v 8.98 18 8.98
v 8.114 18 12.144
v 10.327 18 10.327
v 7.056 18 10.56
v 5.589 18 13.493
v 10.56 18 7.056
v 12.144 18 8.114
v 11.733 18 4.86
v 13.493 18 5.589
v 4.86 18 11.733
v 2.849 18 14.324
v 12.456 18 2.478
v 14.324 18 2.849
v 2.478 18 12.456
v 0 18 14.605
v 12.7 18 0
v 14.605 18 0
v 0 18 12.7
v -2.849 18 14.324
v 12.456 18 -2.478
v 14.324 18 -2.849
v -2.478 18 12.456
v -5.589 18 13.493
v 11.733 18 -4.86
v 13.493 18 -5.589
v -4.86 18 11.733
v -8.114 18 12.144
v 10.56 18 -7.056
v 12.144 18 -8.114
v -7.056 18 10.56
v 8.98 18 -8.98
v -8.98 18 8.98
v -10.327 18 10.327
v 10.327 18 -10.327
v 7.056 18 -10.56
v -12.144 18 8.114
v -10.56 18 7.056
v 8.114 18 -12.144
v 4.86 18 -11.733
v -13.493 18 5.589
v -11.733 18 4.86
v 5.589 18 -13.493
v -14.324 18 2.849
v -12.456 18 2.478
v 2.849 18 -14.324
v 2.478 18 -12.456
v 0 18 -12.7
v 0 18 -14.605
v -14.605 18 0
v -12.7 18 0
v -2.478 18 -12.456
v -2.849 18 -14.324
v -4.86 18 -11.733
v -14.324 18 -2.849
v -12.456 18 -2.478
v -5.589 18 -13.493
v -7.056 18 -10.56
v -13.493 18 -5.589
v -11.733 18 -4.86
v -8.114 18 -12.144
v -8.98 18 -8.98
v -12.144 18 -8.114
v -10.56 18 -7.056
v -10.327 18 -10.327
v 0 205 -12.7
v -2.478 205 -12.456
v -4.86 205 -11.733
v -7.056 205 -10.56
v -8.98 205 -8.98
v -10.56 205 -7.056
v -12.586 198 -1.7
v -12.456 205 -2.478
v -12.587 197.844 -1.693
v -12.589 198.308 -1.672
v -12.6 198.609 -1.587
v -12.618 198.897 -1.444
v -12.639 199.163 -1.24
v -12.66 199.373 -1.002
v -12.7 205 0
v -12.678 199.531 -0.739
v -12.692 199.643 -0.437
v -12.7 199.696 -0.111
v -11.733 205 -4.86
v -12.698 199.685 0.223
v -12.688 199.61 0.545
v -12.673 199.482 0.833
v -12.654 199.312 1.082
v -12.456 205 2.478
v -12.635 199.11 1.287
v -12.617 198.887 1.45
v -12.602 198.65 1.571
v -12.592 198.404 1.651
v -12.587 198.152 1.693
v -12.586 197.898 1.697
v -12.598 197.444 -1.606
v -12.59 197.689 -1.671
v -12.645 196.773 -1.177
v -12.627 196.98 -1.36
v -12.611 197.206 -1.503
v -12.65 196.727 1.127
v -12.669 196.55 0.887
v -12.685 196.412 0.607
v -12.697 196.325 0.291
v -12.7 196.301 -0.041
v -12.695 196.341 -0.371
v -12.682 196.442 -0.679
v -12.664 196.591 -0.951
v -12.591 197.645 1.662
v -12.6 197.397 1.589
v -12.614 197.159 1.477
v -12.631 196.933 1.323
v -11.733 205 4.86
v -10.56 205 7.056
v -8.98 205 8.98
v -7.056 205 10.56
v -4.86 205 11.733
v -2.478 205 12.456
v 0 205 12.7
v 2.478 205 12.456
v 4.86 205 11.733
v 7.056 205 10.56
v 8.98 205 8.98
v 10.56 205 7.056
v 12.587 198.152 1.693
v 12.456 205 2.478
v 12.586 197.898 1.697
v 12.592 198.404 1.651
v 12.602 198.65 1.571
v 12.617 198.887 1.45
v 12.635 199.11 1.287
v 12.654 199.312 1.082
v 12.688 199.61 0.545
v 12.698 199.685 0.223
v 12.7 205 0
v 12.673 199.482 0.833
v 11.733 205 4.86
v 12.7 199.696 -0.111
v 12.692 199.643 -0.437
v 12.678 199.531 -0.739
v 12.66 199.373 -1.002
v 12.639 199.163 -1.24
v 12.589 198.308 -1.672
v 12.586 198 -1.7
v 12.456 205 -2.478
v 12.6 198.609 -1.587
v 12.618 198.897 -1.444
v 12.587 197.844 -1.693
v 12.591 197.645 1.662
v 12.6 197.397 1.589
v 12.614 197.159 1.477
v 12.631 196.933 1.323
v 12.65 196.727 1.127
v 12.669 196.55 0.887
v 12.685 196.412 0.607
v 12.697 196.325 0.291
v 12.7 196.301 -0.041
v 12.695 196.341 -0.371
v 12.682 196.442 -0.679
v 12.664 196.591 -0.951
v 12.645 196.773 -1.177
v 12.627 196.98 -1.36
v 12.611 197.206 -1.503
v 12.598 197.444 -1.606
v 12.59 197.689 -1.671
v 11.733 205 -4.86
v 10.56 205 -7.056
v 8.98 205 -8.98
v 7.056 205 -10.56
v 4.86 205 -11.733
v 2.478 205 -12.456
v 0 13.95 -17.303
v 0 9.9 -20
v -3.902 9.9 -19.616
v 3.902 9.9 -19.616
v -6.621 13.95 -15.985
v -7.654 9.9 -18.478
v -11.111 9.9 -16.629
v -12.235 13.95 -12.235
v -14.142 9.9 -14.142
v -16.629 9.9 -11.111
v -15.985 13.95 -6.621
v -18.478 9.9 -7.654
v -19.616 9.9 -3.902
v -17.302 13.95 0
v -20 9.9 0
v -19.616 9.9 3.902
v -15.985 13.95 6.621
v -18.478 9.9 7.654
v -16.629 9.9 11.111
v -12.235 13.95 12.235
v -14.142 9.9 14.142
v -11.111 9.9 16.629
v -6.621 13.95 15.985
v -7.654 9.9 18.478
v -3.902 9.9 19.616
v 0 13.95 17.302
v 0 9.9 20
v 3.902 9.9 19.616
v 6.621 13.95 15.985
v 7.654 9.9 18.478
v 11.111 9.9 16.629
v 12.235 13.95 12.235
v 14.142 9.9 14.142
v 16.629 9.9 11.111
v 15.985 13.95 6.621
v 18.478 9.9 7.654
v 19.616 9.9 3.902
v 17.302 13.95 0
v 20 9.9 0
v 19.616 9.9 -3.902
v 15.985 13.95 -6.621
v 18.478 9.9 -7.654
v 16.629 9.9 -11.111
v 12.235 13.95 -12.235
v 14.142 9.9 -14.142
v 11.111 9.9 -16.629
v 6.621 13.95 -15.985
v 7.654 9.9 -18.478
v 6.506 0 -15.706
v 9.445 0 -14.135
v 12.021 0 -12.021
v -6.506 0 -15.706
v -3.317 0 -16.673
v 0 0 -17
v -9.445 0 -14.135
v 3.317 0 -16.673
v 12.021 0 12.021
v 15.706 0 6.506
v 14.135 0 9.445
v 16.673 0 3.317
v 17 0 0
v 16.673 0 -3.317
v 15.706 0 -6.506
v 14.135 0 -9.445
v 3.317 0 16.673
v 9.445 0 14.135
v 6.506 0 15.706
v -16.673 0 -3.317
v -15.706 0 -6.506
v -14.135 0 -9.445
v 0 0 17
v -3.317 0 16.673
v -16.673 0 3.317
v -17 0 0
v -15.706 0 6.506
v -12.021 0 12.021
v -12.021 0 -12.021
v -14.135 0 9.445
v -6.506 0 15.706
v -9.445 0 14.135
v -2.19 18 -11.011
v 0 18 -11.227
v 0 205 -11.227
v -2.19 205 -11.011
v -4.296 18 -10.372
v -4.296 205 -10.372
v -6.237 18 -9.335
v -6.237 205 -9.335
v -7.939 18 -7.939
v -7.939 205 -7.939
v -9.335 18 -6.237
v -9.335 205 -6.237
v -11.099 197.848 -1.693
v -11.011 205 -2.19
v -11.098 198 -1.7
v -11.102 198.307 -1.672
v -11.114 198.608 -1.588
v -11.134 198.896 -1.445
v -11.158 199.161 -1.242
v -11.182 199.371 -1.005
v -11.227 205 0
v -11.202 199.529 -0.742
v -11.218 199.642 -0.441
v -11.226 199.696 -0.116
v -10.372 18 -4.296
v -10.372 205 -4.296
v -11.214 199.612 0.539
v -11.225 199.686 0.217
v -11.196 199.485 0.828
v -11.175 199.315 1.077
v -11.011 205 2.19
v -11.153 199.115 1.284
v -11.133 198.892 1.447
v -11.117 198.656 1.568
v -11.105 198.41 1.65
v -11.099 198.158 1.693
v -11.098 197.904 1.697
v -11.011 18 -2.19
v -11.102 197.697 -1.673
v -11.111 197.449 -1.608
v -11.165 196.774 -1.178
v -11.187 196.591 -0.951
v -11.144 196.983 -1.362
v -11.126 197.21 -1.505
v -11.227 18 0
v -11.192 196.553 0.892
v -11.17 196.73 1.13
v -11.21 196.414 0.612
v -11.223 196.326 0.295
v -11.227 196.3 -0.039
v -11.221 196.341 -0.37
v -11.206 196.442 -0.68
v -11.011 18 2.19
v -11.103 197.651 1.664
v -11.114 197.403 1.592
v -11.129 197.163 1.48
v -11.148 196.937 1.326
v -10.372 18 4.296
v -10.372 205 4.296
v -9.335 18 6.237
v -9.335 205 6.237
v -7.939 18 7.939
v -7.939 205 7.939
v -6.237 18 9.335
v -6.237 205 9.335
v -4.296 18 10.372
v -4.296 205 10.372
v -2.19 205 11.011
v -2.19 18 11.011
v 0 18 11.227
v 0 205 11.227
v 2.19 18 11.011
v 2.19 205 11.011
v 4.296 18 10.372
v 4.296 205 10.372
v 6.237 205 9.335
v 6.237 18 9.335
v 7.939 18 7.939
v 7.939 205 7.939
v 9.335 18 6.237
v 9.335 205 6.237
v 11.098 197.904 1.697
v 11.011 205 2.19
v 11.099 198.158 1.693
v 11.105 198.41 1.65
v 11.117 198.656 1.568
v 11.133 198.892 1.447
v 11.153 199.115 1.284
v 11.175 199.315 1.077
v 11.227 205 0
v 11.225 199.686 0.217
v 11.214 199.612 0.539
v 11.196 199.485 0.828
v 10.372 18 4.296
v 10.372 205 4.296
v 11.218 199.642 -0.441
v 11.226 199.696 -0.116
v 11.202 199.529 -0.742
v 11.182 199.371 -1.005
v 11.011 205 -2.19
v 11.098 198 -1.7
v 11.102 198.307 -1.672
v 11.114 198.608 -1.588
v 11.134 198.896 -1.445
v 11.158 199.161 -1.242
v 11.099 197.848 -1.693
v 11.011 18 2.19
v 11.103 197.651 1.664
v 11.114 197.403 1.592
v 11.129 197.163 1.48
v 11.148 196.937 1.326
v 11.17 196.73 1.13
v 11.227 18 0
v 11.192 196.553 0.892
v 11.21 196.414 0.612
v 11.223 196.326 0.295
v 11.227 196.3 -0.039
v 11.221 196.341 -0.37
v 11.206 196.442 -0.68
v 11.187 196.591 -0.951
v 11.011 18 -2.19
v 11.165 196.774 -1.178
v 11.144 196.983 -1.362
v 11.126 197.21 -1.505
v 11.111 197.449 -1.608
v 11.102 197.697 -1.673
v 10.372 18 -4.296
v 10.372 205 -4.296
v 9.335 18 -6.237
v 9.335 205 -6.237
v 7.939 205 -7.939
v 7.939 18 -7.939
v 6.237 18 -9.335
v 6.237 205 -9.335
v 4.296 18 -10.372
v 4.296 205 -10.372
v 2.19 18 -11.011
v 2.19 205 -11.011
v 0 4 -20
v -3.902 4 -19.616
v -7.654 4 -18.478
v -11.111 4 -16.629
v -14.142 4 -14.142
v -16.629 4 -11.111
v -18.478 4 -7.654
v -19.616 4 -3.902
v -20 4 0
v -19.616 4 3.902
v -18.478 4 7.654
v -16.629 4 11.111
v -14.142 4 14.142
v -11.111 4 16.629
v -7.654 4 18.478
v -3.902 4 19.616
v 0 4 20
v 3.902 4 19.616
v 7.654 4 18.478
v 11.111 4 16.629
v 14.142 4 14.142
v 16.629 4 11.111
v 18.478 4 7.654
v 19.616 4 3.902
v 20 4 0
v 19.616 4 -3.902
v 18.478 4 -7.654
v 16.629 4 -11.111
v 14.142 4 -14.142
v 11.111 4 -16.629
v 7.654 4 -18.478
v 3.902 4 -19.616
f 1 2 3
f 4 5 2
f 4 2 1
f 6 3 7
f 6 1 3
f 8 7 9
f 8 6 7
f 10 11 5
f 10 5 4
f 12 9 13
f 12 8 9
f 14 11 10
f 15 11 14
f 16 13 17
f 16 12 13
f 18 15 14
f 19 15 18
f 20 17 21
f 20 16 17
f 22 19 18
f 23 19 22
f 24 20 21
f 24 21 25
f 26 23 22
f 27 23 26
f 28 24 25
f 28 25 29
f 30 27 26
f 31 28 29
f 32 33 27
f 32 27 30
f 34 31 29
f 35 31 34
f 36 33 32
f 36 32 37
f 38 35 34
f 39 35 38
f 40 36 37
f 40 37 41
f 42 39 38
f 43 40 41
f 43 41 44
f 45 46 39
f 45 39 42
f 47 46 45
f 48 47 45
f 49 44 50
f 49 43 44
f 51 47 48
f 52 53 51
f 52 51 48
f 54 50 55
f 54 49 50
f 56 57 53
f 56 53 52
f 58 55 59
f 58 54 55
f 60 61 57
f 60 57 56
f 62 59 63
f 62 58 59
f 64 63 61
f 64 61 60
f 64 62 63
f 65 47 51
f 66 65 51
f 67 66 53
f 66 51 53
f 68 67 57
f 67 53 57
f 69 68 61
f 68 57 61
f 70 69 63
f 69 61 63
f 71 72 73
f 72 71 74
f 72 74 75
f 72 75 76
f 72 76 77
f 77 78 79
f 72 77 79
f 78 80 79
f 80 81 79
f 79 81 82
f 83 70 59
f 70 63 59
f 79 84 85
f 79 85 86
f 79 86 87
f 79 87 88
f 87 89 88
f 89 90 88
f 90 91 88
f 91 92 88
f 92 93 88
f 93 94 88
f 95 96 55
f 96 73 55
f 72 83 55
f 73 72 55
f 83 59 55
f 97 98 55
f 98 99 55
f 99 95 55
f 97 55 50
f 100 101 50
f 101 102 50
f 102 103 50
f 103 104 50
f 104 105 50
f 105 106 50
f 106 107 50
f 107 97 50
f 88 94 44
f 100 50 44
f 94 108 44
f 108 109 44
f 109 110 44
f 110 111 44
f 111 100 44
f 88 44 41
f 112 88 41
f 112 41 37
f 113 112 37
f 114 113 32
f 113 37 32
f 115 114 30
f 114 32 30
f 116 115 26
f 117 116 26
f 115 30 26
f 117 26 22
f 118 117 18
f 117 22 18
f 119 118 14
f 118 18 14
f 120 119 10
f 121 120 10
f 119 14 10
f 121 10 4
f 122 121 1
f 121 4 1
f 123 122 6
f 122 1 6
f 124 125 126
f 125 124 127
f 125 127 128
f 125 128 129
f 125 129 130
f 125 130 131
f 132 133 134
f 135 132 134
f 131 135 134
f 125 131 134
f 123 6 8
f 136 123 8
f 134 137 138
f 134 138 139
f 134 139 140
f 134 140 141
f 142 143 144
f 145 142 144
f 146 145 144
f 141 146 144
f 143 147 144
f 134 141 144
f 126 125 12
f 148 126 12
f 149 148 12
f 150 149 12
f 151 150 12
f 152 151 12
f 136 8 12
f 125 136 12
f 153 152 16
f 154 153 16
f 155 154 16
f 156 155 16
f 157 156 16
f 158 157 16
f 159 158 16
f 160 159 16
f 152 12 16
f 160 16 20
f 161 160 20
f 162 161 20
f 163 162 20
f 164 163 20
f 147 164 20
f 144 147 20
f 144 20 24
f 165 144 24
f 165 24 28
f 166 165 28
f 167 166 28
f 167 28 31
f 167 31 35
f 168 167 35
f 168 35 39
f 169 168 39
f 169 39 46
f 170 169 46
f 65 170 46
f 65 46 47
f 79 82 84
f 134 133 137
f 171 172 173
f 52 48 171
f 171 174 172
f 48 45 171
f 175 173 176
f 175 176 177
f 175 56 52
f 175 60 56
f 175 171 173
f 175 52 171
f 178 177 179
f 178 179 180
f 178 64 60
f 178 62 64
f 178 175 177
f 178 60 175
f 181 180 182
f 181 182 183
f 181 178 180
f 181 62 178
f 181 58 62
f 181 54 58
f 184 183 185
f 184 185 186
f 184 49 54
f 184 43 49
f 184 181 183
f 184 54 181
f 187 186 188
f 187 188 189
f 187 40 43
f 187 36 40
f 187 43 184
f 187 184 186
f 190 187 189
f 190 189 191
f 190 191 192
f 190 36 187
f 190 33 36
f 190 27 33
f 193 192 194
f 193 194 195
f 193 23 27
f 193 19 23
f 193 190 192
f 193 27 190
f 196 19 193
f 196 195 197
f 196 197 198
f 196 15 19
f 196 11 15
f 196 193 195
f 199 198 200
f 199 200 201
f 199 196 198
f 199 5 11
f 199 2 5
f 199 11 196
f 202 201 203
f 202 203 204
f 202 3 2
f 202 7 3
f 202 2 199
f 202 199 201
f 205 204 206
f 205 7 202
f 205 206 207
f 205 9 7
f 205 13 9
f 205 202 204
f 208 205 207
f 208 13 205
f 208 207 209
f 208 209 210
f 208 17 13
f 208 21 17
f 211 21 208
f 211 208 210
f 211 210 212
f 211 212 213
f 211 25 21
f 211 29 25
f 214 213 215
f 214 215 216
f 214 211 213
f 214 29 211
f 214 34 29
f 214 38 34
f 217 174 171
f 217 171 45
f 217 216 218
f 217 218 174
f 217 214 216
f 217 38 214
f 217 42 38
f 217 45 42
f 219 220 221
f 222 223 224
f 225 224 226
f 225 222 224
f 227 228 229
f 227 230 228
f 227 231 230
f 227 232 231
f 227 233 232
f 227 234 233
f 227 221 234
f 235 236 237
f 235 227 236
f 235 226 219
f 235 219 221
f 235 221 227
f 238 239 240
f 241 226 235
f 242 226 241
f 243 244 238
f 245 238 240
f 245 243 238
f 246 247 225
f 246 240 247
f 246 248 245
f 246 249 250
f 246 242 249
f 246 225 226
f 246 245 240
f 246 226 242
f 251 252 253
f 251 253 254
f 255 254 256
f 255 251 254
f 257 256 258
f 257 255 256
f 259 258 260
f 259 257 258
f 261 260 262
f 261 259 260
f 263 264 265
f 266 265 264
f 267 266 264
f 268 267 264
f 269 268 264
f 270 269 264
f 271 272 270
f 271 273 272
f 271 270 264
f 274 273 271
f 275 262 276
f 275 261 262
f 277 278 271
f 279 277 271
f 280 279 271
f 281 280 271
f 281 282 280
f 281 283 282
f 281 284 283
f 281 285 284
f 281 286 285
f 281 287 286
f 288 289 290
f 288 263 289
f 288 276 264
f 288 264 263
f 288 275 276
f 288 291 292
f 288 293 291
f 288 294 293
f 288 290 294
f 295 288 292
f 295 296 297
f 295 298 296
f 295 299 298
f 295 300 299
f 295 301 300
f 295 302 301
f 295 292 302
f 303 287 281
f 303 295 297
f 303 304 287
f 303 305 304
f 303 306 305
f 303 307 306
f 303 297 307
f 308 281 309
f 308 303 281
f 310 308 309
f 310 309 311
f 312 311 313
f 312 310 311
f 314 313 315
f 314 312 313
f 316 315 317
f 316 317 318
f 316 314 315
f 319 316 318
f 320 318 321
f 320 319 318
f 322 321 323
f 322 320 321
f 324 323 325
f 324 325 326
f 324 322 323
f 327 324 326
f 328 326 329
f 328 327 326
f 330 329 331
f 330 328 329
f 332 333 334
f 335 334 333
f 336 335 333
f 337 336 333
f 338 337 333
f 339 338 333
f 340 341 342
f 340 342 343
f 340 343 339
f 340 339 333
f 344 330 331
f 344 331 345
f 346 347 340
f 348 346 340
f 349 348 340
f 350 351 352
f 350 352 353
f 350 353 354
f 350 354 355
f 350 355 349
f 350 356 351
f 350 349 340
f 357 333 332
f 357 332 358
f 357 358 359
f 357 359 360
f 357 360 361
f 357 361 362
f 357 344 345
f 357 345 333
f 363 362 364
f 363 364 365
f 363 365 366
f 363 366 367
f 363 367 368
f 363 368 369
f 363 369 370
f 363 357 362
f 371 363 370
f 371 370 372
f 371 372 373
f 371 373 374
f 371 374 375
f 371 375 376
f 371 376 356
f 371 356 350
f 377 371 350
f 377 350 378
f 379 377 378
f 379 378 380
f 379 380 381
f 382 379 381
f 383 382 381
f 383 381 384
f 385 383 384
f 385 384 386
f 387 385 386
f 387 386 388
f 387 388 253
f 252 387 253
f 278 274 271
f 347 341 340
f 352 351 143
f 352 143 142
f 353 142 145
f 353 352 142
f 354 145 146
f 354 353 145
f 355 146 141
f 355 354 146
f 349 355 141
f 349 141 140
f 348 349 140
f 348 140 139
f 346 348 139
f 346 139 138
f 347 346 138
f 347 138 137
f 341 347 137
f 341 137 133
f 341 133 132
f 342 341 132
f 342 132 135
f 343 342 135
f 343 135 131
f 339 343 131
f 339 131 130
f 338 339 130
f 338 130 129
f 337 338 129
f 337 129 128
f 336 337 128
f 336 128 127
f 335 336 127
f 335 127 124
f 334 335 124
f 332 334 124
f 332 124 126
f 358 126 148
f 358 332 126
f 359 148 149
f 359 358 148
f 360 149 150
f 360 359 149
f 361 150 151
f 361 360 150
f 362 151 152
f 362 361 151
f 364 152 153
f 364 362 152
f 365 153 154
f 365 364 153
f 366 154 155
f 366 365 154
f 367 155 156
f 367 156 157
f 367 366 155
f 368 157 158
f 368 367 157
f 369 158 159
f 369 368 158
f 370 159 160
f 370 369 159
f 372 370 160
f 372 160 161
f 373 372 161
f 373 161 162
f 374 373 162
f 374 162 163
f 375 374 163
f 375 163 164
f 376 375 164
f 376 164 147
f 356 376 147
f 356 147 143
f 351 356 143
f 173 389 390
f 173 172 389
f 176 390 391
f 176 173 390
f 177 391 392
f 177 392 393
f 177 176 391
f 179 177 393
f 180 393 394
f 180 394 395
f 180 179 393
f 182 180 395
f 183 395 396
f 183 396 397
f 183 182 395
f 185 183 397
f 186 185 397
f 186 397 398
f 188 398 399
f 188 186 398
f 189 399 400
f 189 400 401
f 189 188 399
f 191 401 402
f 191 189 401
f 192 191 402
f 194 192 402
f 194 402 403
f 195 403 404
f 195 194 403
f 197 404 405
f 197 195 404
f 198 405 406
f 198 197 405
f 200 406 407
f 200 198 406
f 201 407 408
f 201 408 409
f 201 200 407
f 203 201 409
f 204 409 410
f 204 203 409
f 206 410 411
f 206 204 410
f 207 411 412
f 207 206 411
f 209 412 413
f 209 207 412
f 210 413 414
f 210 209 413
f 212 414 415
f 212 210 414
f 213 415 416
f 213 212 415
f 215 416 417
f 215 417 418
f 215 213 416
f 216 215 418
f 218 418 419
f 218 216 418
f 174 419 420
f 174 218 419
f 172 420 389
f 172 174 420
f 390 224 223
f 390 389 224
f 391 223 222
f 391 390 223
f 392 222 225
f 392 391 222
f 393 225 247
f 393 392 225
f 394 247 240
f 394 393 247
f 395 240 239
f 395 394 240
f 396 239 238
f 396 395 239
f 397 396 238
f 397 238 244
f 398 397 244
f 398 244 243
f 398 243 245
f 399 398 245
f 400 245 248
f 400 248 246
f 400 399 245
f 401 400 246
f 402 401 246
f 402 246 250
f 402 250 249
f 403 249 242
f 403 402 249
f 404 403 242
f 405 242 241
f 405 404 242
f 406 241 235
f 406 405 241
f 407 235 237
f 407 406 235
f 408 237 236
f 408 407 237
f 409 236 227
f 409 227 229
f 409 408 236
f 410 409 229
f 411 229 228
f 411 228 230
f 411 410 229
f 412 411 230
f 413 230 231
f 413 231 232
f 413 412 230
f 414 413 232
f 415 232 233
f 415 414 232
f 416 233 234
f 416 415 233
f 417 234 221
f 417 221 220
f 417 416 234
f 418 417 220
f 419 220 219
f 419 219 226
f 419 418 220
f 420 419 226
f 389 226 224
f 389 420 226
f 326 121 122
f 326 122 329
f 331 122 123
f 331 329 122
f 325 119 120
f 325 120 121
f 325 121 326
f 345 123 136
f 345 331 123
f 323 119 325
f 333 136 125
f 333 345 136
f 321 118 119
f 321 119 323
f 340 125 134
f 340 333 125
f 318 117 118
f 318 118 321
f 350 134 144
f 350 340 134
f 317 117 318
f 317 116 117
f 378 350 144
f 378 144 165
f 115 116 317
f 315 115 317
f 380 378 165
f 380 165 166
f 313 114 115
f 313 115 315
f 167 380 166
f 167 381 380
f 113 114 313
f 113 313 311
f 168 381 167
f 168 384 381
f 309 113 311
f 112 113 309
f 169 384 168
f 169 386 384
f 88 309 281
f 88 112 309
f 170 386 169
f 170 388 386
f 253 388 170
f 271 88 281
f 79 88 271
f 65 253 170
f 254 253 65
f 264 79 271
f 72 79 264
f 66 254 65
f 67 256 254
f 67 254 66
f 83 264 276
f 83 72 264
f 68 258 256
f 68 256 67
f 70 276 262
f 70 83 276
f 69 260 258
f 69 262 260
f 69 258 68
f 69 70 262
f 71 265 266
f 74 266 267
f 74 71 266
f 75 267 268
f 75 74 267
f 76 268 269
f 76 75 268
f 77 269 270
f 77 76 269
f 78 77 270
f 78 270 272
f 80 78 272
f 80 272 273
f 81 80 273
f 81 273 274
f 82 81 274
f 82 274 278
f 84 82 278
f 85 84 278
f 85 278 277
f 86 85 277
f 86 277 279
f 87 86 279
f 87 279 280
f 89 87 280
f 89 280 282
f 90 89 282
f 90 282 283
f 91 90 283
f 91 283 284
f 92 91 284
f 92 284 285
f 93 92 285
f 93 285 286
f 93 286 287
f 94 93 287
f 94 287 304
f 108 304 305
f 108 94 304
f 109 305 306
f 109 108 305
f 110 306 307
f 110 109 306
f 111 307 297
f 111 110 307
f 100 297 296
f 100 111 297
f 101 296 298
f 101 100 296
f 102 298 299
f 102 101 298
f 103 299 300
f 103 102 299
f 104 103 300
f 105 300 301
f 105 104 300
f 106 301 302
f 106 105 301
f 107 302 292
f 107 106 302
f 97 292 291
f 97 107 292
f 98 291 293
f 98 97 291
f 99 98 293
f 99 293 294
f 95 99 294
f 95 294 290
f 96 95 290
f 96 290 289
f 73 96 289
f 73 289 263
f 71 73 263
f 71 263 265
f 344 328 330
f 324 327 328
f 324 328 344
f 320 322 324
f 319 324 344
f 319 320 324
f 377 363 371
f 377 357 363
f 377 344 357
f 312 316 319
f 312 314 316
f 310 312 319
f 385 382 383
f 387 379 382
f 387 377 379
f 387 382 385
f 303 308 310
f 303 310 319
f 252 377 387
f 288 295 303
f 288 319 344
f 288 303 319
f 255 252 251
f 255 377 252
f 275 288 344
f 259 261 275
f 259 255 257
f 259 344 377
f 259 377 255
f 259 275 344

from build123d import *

# Parameters (mm, degrees)
SKETCH1_R               = 12.7
SKETCH1_R_2             = 11.227
BOSS_EXTRUDE1_DEPTH     = 205
CUT_EXTRUDE1_DEPTH      = 207.942020866
CUT_EXTRUDE1_DEPTH_BACK = 207.942020866
SKETCH3_R               = 1.7


with BuildPart() as part:
    # Sketch1 → Boss-Extrude1 (new body)
    with BuildSketch(Plane(origin=(0, 0, 0), x_dir=(1, 0, 0), z_dir=(0, 1, 0))):
        with Locations(Location((0, 0, 0), (0, 0, 90))):
            Circle(SKETCH1_R)
        with Locations(Location((0, 0, 0), (0, 0, 90))):
            Circle(SKETCH1_R_2, mode=Mode.SUBTRACT)
    extrude(amount=BOSS_EXTRUDE1_DEPTH)

    # Sketch2 → Revolve1 (revolve)
    with BuildSketch(Plane.XY, mode=Mode.PRIVATE) as revolve1_sk:
        Polygon((0, 0), (17, 0), (20, 4), (20, 9.9), (14.605, 18), (0, 18), align=None)
    revolve(revolve1_sk.sketch.rotate(Axis((0, -10, 0), (0, 1, 0)), 90), axis=Axis((0, -10, 0), (0, 1, 0)))

    # Sketch3 → Cut-Extrude1 (cut, two sides: drawn at the far end of the back side and taken through both)
    with BuildSketch(Plane(origin=(0, 0, 0), x_dir=(0, 0, -1), z_dir=(1, 0, 0)).offset(-CUT_EXTRUDE1_DEPTH_BACK)):
        with Locations((0, 198)):
            Circle(SKETCH3_R)
    extrude(amount=CUT_EXTRUDE1_DEPTH + CUT_EXTRUDE1_DEPTH_BACK, mode=Mode.SUBTRACT)


solid = part.part
